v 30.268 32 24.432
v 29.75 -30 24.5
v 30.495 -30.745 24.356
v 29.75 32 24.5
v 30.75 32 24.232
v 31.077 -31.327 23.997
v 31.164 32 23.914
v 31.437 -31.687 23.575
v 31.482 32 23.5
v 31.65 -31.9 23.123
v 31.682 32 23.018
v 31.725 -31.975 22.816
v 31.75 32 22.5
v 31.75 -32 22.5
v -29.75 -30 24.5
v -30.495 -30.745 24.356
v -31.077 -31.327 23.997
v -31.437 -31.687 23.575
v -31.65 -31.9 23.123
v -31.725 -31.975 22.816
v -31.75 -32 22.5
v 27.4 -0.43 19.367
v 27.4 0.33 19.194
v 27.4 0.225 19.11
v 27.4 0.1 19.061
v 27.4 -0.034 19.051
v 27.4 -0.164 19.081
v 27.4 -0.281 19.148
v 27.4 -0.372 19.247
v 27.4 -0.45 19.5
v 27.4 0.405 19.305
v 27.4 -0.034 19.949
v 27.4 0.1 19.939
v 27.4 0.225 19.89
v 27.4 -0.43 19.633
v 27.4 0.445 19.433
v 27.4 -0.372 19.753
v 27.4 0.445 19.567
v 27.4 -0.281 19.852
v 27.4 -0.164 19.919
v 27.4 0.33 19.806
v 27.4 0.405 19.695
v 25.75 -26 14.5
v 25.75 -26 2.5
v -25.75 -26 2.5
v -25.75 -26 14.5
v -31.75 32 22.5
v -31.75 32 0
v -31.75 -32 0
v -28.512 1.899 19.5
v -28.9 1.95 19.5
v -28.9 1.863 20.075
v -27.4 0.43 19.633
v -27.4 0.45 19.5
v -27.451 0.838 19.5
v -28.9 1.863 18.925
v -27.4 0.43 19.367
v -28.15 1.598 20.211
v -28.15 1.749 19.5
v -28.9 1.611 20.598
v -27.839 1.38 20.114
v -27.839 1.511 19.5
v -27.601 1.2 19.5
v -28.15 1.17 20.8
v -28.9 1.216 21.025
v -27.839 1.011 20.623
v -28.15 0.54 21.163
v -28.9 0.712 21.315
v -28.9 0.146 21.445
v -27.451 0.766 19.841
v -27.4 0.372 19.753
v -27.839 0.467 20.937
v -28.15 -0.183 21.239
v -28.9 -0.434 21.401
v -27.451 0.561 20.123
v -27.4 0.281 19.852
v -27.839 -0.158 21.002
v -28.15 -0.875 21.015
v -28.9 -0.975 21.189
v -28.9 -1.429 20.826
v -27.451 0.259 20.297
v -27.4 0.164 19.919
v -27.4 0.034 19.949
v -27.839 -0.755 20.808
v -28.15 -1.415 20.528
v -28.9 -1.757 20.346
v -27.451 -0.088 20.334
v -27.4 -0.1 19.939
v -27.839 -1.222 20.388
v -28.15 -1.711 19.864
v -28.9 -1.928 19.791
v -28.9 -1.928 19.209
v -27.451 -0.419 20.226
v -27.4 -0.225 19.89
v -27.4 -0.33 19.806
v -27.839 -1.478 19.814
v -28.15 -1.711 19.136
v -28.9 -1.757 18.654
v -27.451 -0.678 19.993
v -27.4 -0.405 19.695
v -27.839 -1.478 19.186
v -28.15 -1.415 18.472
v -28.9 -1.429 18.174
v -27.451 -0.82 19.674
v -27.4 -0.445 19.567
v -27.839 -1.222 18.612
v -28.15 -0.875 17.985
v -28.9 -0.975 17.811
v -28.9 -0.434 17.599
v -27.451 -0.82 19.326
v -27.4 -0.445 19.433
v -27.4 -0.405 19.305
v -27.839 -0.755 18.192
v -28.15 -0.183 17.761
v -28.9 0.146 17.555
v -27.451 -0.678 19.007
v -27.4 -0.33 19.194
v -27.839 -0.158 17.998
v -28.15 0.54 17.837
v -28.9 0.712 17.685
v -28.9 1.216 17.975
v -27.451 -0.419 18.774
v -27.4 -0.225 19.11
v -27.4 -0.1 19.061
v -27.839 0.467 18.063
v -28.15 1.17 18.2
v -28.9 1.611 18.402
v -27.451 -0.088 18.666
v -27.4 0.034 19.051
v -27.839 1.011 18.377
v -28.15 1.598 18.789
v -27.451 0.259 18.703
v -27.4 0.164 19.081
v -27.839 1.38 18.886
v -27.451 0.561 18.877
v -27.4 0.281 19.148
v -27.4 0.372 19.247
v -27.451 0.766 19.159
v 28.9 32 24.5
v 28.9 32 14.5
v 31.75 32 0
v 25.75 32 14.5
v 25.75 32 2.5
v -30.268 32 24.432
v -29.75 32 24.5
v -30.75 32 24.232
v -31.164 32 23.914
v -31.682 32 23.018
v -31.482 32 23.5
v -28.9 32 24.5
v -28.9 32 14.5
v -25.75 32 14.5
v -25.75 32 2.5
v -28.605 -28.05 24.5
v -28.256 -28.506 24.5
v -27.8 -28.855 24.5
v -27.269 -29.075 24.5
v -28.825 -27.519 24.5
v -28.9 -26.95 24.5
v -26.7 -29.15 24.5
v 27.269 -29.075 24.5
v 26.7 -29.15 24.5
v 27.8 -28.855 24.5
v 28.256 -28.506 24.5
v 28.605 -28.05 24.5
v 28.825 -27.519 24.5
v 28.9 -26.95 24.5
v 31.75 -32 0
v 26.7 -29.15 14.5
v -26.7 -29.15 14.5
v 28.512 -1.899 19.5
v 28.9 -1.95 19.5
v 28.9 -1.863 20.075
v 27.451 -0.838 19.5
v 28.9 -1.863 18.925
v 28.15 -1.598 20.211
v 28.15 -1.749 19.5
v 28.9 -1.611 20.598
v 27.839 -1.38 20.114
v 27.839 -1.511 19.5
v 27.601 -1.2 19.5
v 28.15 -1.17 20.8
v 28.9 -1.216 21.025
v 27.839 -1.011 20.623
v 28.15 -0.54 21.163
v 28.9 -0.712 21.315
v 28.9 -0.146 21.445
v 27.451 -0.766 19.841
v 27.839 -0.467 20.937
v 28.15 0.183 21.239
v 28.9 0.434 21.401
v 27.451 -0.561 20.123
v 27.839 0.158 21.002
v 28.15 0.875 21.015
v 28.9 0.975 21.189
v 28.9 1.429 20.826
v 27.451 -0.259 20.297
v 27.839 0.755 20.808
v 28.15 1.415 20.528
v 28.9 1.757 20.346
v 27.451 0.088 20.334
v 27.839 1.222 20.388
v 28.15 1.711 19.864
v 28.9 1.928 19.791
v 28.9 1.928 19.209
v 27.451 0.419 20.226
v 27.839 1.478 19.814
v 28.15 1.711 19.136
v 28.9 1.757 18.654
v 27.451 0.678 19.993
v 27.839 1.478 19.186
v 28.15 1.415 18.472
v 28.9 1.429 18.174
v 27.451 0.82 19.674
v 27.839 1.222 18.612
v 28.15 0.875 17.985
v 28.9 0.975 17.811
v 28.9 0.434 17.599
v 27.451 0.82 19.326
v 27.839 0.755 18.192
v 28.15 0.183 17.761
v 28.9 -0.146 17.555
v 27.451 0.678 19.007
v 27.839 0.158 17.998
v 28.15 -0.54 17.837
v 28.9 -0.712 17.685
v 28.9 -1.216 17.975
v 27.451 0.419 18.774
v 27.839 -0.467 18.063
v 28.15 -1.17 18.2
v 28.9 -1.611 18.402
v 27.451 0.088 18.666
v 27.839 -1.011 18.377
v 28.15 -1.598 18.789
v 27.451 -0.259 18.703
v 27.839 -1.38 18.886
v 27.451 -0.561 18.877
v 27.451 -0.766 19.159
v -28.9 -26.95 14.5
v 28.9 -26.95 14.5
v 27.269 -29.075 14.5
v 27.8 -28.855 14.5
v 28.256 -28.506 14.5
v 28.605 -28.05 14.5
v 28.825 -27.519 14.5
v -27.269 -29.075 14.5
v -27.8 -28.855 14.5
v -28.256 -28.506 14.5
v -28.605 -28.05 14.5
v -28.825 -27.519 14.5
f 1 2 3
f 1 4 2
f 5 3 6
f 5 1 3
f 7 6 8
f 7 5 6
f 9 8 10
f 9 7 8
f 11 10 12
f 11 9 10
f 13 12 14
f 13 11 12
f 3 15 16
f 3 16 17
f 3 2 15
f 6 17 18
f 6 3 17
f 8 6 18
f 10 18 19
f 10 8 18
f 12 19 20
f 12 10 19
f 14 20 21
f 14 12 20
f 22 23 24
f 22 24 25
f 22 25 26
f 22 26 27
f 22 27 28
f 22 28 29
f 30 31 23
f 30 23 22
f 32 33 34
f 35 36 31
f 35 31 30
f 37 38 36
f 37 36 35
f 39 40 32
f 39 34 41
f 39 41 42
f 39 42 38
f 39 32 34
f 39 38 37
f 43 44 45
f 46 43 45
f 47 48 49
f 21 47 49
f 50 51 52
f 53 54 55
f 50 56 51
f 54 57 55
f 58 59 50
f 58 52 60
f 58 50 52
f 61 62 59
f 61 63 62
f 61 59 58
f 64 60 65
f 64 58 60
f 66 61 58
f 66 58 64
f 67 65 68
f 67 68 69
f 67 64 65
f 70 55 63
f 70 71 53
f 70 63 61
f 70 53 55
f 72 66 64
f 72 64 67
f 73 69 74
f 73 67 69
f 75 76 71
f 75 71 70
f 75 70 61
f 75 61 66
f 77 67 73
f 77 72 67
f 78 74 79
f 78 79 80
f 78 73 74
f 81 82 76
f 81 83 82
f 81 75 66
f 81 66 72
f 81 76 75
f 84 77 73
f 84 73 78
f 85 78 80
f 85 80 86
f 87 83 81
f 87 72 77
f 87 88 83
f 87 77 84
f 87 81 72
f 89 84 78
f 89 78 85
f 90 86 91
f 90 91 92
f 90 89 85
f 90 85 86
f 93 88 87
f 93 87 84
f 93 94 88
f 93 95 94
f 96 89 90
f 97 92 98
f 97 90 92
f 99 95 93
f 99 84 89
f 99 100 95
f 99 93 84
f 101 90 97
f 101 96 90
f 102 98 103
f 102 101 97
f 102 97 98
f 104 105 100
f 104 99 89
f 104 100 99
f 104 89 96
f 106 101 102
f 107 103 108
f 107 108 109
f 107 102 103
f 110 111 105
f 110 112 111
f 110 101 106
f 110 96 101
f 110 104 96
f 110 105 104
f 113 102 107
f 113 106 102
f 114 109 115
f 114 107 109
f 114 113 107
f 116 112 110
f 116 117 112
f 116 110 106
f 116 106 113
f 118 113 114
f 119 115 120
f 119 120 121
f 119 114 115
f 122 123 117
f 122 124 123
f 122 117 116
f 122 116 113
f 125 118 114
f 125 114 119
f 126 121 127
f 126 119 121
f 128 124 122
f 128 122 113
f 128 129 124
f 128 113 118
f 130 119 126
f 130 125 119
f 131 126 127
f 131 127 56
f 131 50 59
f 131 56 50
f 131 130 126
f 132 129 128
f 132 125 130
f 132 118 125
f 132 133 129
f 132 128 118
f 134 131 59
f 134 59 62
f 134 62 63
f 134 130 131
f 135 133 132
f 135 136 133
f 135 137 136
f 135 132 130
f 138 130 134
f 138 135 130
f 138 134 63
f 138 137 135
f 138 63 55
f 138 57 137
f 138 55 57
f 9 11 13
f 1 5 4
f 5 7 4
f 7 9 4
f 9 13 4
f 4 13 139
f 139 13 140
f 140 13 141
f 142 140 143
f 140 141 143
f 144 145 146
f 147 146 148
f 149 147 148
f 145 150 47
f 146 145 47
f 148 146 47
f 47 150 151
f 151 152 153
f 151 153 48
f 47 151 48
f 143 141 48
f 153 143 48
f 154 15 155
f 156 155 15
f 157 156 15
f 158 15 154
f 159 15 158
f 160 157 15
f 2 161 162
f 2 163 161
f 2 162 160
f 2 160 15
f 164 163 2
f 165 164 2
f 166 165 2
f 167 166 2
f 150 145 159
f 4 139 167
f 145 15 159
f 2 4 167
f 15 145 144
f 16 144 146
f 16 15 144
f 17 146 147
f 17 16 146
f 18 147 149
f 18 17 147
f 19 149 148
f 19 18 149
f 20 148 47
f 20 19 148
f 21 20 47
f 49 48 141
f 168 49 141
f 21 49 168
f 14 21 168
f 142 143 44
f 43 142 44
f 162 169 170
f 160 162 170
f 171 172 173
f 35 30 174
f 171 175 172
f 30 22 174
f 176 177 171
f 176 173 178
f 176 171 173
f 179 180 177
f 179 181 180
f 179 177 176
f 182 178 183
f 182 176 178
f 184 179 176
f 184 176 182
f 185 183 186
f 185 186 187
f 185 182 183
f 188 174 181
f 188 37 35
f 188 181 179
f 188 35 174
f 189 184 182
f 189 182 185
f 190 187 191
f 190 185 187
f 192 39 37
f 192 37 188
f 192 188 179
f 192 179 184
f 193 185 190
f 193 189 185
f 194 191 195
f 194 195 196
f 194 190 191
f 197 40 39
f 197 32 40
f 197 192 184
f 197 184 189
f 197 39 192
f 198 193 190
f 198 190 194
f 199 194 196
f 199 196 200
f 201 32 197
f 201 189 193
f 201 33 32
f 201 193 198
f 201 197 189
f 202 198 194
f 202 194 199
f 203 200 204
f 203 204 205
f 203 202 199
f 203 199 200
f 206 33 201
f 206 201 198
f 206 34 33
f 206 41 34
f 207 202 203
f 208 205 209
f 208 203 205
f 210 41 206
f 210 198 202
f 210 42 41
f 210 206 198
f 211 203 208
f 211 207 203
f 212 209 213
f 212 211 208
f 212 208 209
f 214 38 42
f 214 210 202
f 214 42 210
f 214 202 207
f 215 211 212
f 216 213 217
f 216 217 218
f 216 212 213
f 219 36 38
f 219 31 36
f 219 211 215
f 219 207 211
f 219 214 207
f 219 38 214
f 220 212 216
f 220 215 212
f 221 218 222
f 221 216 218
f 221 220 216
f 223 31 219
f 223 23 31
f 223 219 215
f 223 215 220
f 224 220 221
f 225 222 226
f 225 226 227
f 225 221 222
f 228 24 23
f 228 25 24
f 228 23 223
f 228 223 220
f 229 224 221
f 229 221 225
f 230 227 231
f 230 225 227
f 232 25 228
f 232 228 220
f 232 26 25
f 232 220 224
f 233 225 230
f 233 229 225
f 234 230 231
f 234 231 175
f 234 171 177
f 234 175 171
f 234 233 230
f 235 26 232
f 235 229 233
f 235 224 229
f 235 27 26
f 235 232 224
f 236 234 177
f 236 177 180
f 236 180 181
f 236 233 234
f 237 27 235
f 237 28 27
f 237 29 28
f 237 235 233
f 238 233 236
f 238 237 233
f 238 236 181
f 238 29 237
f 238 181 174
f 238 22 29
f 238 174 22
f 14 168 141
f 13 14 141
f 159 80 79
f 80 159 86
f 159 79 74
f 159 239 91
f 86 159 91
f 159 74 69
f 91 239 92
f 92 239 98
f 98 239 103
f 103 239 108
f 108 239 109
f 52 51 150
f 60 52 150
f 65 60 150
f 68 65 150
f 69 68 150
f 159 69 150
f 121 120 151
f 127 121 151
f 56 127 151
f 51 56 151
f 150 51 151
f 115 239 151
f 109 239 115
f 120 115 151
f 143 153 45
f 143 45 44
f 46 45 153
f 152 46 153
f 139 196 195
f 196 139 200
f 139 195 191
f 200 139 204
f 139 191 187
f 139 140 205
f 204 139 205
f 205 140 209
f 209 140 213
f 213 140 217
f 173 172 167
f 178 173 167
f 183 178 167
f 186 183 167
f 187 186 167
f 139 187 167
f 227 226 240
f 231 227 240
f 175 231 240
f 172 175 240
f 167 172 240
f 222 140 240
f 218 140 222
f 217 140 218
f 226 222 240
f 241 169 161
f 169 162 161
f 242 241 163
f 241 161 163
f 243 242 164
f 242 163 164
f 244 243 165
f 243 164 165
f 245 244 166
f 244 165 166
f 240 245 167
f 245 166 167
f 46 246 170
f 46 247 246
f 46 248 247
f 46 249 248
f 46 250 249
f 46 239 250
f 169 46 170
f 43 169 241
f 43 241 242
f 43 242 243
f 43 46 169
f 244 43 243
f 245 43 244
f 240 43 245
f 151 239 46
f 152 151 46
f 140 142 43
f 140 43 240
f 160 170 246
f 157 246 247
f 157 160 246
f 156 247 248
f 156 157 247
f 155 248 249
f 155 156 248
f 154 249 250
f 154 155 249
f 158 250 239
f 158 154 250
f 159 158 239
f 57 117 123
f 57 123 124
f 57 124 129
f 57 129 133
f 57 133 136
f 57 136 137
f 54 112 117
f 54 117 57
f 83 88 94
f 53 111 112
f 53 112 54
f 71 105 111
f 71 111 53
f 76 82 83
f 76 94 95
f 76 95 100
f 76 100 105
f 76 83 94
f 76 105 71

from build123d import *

# Parameters (mm, degrees)
F0_W      = 63.5
F0_H      = 64
F1_DEPTH  = 2.5
F3_DEPTH  = 12
F5_DEPTH  = 10
F6_R      = 2.2
F7_R      = 2
F8_R      = 1.95
F9_DEPTH  = 1.5
F10_R     = 1.49999
F11_R     = 1.95
F12_DEPTH = 1.5
F13_R     = 1.49999


# Not quite as in the source:
# - a fillet or chamfer is up to 0.001 mm smaller than in the source, because OpenCascade refuses the exact size


with BuildPart() as f1:
    # F0 (on Top) → F1 (new body)
    with BuildSketch(Plane.XY):
        Rectangle(F0_W, F0_H)
    extrude(amount=F1_DEPTH)

    # F2 (on face) → F3 (join)
    with BuildSketch(Plane.XY.offset(2.5)):
        Polygon((-25.75, 32), (-31.75, 32), (-31.75, -32), (31.75, -32), (31.75, 32), (25.75, 32), (25.75, -26), (-25.75, -26), align=None)
    extrude(amount=F3_DEPTH)

    # F4 (on face) → F5 (join)
    with BuildSketch(Plane.XY.offset(14.5)):
        Polygon((-28.9, 32), (-31.75, 32), (-31.75, -32), (31.75, -32), (31.75, 32), (28.9, 32), (28.9, -29.15), (-28.9, -29.15), align=None)
    extrude(amount=F5_DEPTH)

    # F6
    f6_edges = [f1.edges().sort_by_distance(p)[0] for p in [
        (-28.9, -29.15, 19.5),
        (28.9, -29.15, 19.5),
    ]]
    fillet(f6_edges, radius=F6_R)

    # F7
    f7_edges = [f1.edges().sort_by_distance(p)[0] for p in [
        (-31.75, 0, 24.5),
        (0, -32, 24.5),
        (31.75, 0, 24.5),
    ]]
    fillet(f7_edges, radius=F7_R)

    # F8 (on face) → F9 (join)
    with BuildSketch(Plane.YZ.offset(-28.9)):
        with Locations((0, 19.5)):
            Circle(F8_R)
    extrude(amount=F9_DEPTH)

    # F10 (radius 1.5 in the source; OpenCascade refuses exactly that, so slightly less here)
    f10_edges = [f1.edges().sort_by_distance(p)[0] for p in [
        (-27.4, -1.95, 19.5),
    ]]
    fillet(f10_edges, radius=F10_R)

    # F11 (on face) → F12 (join)
    with BuildSketch(Plane(origin=(28.9, 0, 0), x_dir=(0, -1, 0), z_dir=(-1, 0, 0))):
        with Locations((0, 19.5)):
            Circle(F11_R)
    extrude(amount=F12_DEPTH)

    # F13 (radius 1.5 in the source; OpenCascade refuses exactly that, so slightly less here)
    f13_edges = [f1.edges().sort_by_distance(p)[0] for p in [
        (27.4, 1.95, 19.5),
    ]]
    fillet(f13_edges, radius=F13_R)


solid = f1.part
